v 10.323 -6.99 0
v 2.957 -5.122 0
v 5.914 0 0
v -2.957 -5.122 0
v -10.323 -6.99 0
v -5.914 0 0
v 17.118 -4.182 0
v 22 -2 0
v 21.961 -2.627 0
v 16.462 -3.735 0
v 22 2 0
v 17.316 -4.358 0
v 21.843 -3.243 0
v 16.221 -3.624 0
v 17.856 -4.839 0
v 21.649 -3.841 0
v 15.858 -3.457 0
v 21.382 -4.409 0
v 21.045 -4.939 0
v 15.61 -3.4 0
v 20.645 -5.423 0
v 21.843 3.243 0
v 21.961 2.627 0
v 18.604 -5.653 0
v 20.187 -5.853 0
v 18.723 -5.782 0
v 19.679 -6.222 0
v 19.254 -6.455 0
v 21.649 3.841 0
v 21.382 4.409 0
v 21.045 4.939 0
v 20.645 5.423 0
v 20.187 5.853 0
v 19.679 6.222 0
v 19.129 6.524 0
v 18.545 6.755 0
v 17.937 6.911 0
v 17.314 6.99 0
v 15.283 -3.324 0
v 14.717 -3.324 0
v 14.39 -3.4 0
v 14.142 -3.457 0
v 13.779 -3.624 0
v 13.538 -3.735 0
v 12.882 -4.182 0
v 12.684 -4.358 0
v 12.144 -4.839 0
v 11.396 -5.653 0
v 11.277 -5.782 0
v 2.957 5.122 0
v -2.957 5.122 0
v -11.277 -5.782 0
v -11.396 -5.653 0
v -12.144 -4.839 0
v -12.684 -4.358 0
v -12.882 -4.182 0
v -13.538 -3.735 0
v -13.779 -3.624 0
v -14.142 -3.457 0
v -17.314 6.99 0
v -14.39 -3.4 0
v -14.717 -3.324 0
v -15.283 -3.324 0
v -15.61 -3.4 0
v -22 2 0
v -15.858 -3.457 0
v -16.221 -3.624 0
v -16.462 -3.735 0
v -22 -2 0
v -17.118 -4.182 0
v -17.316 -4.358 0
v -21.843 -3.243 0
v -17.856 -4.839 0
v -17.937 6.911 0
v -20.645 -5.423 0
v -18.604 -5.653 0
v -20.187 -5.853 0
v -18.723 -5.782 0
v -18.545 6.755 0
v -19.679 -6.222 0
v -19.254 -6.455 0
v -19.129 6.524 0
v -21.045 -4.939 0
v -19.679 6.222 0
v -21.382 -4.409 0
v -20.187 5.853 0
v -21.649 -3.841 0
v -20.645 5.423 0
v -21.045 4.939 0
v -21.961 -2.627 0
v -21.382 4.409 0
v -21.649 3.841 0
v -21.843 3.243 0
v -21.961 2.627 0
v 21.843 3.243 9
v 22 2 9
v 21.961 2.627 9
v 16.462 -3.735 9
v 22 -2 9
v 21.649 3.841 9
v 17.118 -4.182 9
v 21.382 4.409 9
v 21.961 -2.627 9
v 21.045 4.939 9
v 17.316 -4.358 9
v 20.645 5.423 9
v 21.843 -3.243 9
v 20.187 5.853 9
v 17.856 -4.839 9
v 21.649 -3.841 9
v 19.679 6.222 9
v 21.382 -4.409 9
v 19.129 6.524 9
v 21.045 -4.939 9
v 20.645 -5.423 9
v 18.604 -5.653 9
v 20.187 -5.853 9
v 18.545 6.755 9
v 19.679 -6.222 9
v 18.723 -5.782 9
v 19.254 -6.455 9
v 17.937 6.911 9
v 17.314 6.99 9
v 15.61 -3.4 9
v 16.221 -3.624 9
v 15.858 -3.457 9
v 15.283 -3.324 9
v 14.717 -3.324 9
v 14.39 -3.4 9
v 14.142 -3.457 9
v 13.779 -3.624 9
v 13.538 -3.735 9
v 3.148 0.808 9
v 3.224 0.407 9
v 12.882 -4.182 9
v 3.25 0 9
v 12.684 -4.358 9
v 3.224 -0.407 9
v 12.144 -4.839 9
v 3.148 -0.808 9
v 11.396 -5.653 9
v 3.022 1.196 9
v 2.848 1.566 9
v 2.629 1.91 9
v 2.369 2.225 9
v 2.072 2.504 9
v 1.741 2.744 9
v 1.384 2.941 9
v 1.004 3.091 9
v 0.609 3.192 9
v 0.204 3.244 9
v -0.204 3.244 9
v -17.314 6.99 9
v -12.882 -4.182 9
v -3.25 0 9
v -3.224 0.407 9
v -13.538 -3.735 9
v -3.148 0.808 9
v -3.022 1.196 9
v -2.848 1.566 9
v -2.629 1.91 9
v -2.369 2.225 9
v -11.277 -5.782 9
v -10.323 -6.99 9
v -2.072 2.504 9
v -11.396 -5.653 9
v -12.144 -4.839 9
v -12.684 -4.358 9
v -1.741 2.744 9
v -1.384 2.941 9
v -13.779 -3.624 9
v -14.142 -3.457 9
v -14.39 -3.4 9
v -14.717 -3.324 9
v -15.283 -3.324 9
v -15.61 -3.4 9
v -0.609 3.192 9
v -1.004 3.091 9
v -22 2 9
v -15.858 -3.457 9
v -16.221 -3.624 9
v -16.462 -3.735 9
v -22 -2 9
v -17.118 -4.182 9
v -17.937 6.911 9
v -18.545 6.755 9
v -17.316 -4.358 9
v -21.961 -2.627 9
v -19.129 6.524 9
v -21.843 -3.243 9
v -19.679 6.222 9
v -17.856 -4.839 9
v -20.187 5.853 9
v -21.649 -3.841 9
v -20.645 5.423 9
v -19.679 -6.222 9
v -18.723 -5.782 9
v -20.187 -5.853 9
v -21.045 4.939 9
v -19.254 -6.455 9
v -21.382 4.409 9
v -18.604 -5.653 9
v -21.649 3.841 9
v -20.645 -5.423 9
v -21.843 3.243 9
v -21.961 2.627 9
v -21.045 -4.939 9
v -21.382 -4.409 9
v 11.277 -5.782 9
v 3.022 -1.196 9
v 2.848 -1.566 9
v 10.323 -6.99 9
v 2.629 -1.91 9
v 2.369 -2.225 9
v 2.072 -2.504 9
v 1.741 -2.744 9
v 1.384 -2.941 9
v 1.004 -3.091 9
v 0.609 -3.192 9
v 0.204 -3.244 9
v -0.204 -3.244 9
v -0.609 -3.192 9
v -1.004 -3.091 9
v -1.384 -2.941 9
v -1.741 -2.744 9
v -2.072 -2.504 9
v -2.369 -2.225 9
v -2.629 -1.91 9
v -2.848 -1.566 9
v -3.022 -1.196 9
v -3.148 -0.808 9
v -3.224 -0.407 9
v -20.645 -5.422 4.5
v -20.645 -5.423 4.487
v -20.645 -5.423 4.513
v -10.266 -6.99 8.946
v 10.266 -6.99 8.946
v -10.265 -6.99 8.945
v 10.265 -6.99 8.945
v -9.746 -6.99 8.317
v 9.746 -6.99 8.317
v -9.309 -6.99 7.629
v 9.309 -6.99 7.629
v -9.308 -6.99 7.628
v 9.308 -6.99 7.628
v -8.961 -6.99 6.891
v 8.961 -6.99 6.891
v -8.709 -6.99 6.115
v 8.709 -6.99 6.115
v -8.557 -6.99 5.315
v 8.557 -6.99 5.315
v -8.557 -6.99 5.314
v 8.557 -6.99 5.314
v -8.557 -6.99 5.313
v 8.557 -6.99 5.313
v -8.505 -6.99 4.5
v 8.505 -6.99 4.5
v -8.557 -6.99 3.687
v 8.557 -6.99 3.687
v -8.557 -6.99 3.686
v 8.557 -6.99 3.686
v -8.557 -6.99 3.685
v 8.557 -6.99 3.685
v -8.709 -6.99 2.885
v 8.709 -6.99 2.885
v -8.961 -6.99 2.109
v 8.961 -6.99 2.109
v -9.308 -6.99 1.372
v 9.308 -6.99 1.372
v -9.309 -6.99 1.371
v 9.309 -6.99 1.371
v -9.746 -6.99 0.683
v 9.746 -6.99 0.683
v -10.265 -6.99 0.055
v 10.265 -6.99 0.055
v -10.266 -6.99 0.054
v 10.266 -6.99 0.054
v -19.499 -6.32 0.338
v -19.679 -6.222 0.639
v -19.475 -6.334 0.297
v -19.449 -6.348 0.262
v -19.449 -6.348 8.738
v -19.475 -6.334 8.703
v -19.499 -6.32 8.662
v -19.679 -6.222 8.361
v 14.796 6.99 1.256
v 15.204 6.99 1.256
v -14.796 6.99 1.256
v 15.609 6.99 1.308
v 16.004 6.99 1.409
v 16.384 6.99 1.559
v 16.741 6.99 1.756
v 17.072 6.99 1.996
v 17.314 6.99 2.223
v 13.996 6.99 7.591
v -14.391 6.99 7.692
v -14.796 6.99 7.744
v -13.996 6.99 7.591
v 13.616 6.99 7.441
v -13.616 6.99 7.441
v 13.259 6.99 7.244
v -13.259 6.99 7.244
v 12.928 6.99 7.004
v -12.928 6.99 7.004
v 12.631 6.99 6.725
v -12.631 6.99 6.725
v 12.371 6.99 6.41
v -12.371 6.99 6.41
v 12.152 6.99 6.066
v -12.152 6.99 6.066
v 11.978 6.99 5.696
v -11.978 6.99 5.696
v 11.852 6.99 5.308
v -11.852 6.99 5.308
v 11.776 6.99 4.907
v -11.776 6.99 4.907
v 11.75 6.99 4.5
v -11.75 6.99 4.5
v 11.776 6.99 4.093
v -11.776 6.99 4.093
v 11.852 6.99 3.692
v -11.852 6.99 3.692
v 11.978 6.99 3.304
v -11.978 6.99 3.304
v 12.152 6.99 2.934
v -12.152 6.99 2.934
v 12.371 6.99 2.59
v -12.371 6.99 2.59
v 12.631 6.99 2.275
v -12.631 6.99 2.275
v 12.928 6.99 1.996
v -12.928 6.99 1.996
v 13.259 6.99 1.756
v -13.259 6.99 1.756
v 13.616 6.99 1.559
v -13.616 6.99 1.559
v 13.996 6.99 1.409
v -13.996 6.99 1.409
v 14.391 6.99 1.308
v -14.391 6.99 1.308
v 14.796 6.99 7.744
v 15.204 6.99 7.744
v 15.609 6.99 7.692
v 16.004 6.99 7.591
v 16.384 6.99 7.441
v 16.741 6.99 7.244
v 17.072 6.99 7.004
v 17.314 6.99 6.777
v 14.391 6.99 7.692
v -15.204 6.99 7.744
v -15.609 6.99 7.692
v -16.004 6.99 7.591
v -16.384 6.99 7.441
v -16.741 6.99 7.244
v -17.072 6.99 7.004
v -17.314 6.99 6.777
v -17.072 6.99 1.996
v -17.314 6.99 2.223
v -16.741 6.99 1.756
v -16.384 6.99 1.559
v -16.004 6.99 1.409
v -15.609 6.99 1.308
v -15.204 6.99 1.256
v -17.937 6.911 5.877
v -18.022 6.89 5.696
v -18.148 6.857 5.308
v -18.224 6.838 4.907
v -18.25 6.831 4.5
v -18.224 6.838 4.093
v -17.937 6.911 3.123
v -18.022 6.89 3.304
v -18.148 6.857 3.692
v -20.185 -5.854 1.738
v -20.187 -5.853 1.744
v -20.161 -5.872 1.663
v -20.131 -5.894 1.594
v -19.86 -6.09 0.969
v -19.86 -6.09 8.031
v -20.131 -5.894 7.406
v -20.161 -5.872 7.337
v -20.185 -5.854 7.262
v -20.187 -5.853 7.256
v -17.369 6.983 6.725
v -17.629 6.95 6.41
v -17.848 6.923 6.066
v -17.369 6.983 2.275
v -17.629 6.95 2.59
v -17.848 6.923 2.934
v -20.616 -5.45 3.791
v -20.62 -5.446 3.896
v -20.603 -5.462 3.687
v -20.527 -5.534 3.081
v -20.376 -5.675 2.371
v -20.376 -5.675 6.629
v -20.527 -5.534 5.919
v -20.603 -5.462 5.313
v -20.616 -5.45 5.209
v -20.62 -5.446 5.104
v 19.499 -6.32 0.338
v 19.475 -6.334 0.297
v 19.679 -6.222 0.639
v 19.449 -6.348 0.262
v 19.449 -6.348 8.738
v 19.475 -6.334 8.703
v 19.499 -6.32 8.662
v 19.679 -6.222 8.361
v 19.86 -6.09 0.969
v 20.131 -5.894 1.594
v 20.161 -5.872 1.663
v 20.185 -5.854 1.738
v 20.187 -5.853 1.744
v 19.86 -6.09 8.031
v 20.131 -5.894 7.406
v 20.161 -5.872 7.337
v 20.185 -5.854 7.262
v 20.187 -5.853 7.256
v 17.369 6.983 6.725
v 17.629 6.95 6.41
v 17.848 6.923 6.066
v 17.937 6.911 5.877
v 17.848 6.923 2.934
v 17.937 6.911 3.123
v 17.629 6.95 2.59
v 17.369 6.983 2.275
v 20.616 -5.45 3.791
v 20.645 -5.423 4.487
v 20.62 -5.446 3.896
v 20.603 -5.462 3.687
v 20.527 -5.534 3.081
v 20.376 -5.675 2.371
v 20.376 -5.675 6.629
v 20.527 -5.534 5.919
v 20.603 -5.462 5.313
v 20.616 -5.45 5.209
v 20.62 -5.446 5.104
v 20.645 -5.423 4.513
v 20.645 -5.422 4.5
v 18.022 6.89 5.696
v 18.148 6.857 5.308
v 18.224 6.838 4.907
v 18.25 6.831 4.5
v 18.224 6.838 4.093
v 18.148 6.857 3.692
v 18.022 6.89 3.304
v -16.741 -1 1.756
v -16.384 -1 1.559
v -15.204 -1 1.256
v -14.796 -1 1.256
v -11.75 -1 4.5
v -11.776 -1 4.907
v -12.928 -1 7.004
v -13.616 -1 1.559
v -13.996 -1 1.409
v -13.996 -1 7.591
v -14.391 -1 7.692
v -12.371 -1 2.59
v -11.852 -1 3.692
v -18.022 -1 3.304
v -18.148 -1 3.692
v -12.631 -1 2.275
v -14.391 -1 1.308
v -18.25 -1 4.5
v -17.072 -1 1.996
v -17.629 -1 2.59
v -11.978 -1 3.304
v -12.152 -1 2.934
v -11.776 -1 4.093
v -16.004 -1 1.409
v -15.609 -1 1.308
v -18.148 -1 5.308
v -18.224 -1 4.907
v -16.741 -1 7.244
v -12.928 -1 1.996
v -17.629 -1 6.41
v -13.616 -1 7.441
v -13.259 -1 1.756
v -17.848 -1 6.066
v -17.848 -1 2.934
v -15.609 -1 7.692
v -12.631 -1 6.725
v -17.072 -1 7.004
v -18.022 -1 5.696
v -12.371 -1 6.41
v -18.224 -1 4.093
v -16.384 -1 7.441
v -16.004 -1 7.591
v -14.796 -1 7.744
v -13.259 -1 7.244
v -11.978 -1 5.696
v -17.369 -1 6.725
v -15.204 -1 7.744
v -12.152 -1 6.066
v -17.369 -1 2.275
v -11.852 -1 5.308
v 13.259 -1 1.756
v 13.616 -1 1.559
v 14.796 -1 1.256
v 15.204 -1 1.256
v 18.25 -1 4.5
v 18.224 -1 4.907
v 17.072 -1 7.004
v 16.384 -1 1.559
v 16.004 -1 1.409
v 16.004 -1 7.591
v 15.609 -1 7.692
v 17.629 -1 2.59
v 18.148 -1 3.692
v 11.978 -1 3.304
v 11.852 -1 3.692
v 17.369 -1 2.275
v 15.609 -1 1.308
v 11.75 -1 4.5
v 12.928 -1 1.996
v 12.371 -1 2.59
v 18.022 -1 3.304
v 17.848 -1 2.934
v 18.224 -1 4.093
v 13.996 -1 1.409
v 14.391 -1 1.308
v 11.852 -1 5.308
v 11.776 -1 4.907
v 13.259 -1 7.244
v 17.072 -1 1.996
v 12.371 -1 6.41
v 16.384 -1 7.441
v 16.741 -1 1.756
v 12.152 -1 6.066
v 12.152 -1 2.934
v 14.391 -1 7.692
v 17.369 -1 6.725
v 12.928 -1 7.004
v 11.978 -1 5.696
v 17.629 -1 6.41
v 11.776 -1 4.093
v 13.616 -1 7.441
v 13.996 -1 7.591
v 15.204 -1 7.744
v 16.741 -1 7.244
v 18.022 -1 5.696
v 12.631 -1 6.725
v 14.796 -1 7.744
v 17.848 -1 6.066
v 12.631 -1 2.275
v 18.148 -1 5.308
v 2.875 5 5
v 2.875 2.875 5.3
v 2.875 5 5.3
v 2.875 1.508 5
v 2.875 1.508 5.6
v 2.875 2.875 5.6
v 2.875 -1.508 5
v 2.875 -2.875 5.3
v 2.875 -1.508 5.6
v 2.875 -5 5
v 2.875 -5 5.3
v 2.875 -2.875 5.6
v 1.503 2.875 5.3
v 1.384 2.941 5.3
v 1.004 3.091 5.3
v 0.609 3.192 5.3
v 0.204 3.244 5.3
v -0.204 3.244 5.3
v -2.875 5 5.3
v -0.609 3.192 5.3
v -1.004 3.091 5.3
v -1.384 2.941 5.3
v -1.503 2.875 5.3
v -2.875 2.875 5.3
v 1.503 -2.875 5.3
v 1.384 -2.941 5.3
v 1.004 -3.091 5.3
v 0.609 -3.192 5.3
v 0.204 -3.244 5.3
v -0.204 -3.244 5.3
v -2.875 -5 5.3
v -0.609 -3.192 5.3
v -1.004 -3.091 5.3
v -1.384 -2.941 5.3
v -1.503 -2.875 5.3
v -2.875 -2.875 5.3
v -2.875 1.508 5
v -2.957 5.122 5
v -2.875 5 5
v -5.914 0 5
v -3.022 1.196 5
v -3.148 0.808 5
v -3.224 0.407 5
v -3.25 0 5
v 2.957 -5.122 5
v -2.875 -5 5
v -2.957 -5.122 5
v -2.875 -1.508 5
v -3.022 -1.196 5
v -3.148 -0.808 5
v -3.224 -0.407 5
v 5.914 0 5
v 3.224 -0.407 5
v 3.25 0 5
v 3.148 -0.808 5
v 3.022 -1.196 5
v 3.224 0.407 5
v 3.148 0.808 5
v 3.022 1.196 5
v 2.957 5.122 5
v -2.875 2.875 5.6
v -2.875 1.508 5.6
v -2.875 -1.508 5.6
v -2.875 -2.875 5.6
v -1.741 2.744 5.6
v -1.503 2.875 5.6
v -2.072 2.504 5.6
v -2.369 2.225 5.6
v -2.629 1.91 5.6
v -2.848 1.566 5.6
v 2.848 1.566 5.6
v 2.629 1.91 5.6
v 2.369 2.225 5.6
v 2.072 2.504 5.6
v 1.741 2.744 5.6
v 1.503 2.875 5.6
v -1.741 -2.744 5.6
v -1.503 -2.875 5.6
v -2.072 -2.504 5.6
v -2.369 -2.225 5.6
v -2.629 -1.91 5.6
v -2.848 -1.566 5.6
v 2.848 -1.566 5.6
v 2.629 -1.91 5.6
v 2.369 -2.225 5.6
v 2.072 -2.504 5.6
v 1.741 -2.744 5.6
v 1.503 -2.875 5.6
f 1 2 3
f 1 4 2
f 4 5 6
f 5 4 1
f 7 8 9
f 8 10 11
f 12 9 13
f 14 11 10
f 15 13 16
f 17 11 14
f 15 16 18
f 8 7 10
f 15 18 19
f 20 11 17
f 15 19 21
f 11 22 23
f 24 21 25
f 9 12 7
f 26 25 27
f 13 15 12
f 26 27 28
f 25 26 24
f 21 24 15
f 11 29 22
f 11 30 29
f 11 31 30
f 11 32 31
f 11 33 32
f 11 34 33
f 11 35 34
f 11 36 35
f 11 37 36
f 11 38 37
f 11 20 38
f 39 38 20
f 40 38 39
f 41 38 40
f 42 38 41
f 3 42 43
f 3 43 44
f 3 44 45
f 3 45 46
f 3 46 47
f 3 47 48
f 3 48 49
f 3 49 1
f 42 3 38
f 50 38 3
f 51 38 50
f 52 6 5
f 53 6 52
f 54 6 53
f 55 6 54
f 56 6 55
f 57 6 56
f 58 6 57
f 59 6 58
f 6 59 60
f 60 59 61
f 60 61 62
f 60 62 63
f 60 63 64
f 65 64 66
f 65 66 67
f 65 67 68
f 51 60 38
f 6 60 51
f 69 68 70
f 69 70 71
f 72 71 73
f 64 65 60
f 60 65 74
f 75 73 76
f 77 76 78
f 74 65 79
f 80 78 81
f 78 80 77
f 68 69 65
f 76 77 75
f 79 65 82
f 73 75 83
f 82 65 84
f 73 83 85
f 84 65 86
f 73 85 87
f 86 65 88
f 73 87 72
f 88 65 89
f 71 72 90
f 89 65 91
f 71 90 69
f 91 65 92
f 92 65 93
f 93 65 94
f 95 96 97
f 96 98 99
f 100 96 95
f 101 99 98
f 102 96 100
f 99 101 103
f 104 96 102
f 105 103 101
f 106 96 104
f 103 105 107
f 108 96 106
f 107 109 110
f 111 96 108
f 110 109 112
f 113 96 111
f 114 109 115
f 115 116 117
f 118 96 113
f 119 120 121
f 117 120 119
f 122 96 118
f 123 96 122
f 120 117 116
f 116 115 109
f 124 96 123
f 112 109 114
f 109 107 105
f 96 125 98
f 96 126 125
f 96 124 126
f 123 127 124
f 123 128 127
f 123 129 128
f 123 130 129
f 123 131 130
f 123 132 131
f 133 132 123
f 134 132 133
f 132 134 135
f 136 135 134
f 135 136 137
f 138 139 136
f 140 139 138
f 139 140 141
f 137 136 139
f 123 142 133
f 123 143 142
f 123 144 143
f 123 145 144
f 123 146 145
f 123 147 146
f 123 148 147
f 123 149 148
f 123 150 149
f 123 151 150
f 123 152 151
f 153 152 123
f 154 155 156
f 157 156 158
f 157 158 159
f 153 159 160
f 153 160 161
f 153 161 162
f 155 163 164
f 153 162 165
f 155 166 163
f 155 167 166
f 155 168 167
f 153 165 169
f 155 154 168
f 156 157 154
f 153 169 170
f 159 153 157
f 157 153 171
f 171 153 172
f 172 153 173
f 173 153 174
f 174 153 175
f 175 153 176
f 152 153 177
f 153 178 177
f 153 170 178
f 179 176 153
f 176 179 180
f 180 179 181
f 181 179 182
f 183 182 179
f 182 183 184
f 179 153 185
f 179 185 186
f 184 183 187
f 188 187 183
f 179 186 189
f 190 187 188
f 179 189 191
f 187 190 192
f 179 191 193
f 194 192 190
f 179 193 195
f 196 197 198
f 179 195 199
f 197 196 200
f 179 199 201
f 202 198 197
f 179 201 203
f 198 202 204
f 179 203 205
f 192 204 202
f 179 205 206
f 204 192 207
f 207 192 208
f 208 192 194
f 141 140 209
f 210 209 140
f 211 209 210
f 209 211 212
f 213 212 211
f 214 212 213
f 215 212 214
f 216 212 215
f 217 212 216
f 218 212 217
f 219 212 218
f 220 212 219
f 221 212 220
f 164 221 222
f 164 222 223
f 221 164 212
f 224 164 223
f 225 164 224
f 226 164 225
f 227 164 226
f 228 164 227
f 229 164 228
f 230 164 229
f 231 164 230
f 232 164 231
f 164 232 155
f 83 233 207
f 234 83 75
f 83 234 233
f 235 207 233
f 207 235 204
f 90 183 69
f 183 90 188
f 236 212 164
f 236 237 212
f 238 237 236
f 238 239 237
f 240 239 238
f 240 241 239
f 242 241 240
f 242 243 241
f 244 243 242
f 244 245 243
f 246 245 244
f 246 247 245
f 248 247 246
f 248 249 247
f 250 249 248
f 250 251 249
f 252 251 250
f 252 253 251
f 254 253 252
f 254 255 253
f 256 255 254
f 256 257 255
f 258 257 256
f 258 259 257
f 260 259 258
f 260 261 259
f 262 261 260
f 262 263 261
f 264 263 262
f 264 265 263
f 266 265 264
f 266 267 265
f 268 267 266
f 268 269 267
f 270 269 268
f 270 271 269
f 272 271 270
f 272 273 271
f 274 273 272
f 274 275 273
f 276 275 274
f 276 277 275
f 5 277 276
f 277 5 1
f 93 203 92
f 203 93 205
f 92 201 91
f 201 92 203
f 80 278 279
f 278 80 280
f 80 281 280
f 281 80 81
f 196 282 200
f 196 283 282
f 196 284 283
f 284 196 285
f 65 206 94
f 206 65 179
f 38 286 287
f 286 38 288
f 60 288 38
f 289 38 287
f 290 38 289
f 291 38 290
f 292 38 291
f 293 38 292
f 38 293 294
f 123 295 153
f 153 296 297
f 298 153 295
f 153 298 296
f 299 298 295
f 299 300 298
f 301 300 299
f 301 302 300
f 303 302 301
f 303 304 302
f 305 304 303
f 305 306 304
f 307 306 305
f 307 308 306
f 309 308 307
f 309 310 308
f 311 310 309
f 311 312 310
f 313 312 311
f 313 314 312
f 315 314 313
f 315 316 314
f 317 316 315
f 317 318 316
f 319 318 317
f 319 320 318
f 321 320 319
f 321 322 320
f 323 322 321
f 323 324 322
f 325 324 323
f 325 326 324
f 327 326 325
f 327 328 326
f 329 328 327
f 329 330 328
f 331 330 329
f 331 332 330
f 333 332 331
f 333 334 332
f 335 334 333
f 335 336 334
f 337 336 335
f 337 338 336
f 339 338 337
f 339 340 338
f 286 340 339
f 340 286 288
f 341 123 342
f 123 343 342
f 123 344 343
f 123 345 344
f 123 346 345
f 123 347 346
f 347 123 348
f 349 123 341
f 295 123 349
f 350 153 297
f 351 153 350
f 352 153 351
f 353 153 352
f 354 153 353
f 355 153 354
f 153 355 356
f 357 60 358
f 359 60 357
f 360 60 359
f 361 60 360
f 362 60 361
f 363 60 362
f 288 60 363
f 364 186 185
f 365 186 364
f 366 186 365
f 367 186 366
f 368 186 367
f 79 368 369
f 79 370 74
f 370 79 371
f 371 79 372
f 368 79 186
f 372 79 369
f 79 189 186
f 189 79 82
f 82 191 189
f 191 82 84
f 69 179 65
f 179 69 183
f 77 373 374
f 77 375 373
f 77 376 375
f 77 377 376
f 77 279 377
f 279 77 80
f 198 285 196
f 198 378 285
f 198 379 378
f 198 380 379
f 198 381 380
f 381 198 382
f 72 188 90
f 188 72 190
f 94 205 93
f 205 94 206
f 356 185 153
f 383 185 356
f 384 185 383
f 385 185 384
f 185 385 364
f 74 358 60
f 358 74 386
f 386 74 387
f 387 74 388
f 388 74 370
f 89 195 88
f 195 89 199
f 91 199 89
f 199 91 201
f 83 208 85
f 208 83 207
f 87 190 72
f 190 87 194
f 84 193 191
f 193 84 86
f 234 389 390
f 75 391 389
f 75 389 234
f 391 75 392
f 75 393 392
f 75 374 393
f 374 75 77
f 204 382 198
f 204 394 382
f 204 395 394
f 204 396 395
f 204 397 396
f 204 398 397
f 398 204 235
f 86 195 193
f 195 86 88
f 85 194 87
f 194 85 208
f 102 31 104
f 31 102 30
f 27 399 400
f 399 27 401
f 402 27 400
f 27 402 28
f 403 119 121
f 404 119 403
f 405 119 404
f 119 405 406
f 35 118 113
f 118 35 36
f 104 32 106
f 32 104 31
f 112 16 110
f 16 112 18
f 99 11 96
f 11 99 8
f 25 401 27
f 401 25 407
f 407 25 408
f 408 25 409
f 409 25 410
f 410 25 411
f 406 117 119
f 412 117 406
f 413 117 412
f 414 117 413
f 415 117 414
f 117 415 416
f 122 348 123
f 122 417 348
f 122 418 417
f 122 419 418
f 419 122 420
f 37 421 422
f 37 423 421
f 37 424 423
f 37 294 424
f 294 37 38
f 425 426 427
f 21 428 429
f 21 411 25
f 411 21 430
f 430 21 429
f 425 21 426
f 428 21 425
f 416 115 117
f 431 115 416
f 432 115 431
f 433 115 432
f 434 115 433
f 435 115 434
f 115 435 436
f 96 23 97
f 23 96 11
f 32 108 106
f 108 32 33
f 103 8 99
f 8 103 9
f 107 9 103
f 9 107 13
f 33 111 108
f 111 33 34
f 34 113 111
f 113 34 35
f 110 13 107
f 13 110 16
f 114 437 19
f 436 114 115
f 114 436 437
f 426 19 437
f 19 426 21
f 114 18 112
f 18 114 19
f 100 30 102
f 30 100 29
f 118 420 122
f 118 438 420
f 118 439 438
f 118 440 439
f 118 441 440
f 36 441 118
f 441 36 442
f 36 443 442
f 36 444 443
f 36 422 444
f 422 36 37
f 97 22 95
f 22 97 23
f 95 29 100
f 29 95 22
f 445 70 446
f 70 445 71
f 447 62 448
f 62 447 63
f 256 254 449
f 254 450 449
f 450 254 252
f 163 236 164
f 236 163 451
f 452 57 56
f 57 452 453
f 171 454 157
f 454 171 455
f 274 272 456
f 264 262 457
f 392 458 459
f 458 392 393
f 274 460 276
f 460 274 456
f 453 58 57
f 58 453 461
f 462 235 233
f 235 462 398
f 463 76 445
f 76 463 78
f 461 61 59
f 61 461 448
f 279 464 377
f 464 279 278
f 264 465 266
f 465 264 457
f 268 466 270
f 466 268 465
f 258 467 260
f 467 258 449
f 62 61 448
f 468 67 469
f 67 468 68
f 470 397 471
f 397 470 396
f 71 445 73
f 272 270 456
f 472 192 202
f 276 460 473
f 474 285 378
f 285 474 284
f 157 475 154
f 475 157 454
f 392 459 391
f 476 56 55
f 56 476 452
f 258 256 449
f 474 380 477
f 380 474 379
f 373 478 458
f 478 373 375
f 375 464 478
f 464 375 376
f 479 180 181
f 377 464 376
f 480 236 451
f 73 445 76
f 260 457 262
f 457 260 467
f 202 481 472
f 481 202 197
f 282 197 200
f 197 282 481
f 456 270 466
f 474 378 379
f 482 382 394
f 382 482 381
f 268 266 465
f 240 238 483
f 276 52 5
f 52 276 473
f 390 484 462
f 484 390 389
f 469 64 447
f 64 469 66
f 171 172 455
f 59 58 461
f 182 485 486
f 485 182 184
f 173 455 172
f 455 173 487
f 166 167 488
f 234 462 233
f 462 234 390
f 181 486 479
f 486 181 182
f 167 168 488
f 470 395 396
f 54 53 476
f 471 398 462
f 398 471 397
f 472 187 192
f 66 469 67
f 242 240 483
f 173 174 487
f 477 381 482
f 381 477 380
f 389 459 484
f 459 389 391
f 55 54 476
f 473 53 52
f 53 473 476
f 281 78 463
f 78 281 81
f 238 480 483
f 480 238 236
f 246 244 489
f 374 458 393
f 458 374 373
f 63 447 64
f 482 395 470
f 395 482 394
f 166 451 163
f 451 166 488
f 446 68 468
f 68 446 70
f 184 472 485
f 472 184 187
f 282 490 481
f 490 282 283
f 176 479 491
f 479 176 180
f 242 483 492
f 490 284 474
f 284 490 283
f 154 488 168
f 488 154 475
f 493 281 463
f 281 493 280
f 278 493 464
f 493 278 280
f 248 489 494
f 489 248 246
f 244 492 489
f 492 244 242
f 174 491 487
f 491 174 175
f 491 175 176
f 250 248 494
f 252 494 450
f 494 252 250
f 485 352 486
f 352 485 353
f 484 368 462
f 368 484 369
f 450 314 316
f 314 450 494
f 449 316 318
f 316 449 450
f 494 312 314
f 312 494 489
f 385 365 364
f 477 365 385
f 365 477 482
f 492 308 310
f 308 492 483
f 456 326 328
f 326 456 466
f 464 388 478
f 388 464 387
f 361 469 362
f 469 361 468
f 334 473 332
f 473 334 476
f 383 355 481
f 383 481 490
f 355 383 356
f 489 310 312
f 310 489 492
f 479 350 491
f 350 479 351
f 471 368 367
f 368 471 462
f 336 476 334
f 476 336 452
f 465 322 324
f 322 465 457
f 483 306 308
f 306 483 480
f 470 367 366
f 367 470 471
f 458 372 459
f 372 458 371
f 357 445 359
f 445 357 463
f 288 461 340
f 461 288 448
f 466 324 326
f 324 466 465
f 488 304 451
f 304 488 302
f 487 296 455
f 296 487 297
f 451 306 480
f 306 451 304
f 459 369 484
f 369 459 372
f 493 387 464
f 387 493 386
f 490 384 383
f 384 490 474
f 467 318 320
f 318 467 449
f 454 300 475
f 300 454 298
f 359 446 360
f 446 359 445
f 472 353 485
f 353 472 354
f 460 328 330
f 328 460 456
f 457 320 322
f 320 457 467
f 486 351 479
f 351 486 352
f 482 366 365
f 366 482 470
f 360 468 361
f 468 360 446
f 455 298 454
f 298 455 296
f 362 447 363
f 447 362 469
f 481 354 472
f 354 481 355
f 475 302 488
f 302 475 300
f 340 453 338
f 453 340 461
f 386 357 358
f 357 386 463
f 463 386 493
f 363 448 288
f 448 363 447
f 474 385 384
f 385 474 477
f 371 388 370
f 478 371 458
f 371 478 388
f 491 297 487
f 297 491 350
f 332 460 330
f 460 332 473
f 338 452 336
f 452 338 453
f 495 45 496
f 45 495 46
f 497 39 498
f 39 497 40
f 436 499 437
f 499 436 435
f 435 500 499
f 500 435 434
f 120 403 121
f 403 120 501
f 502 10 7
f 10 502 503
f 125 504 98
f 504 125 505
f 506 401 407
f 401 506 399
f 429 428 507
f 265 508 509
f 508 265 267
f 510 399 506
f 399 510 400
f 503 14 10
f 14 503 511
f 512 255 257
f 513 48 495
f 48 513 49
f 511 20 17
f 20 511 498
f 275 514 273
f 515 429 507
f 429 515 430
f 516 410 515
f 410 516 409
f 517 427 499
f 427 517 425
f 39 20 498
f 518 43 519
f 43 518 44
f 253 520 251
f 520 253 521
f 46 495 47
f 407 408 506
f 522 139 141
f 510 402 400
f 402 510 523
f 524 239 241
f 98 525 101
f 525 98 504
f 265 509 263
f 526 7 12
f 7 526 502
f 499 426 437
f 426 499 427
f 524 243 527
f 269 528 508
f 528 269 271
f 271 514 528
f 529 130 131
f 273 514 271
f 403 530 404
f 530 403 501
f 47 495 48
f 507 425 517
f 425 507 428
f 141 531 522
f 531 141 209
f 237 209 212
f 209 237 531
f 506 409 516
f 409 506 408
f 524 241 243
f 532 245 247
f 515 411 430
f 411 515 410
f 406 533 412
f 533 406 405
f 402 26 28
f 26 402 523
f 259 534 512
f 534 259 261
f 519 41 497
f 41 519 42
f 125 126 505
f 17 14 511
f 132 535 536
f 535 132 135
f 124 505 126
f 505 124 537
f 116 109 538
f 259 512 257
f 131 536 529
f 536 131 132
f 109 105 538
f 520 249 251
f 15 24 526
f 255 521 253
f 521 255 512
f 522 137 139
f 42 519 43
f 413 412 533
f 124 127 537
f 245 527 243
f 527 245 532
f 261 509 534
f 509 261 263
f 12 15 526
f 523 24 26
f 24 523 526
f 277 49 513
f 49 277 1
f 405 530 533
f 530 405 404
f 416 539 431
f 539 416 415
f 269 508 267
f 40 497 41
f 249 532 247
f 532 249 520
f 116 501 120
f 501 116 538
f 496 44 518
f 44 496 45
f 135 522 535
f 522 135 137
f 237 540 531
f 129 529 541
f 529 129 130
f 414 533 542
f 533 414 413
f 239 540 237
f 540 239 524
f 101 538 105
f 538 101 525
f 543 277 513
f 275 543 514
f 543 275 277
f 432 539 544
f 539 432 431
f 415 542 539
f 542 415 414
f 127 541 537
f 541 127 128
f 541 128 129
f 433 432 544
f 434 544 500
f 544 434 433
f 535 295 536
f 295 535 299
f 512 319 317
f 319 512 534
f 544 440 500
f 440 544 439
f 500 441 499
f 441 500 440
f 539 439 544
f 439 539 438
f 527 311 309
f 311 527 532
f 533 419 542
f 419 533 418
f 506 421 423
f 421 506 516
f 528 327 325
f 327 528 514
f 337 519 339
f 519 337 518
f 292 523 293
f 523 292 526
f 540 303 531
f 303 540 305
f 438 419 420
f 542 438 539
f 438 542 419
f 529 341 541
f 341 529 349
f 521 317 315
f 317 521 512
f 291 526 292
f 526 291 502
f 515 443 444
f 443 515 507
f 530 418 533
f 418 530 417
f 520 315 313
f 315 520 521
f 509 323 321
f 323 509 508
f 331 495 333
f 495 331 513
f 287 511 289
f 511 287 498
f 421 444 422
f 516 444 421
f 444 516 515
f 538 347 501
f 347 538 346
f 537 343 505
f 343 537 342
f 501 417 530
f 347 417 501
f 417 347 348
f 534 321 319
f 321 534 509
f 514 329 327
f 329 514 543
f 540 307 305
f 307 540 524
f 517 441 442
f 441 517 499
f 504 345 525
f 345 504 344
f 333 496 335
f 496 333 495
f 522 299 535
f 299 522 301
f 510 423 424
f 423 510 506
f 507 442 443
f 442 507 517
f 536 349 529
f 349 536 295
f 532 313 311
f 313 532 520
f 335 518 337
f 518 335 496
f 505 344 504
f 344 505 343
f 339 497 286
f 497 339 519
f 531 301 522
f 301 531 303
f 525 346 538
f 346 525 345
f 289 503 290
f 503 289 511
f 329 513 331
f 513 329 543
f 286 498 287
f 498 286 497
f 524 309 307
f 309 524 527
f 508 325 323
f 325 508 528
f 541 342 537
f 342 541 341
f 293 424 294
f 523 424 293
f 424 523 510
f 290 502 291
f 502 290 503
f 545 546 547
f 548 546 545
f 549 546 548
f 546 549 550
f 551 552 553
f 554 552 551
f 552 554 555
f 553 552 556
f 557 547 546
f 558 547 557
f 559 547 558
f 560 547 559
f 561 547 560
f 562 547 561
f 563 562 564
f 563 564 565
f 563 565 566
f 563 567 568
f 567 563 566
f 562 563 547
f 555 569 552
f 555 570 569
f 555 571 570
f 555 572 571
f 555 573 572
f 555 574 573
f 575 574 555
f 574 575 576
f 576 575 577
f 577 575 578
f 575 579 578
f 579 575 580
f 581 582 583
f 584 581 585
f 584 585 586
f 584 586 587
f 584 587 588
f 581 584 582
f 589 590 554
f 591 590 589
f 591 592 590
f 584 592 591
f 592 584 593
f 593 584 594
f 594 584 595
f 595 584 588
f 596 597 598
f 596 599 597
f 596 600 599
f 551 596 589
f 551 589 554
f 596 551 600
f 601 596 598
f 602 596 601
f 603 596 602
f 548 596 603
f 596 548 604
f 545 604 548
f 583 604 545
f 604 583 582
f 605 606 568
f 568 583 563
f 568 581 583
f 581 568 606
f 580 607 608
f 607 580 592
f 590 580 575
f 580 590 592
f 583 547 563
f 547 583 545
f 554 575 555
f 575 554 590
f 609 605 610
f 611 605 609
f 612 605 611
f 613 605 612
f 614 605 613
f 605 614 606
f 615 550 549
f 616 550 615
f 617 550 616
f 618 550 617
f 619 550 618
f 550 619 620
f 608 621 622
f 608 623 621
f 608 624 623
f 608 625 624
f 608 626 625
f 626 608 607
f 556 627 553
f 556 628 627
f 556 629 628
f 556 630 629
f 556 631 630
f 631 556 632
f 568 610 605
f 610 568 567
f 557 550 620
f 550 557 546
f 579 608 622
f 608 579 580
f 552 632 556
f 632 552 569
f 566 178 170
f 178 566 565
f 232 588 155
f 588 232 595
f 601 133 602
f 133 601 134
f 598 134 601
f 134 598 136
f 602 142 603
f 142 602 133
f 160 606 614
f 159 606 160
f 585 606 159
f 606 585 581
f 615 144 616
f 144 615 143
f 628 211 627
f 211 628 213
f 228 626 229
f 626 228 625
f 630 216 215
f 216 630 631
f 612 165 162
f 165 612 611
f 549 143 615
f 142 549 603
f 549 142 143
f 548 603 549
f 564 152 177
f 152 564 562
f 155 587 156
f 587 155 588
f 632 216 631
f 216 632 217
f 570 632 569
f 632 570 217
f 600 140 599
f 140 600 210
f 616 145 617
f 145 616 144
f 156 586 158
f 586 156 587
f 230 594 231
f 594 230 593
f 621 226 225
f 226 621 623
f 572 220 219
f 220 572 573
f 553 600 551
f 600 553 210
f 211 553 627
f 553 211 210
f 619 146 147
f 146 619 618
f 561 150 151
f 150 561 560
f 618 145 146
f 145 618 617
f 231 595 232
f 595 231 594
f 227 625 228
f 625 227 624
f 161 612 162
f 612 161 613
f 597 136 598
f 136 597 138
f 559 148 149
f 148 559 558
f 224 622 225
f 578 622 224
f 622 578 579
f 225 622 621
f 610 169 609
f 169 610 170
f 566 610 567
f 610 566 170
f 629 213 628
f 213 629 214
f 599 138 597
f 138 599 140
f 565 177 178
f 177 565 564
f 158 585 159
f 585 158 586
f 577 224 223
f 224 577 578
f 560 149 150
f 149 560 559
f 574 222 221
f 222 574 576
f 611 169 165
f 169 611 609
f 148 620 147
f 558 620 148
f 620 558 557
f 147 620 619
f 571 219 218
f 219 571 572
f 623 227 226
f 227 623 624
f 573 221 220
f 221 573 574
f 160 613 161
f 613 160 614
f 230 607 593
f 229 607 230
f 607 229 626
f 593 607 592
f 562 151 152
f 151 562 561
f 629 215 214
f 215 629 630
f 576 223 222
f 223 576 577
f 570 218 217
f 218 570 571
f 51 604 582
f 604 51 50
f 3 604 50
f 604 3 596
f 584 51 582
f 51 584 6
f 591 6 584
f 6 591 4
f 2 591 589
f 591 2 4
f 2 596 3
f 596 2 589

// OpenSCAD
$fn = 50;


difference() {
	union() {
		cylinder(h = 9, r = 7.0000000000);
		translate(v = [-7.5000000000, 0.0000000000, 0]) {
			hull() {
				translate(v = [-9.5000000000, 2.0000000000, 0]) {
					cylinder(h = 9, r = 5);
				}
				translate(v = [9.5000000000, 2.0000000000, 0]) {
					cylinder(h = 9, r = 5);
				}
				translate(v = [-9.5000000000, -2.0000000000, 0]) {
					cylinder(h = 9, r = 5);
				}
				translate(v = [9.5000000000, -2.0000000000, 0]) {
					cylinder(h = 9, r = 5);
				}
			}
		}
		translate(v = [-7.5000000000, 0.0000000000, 0]) {
			hull() {
				translate(v = [-9.5000000000, 2.0000000000, 0]) {
					cylinder(h = 9, r = 5);
				}
				translate(v = [9.5000000000, 2.0000000000, 0]) {
					cylinder(h = 9, r = 5);
				}
				translate(v = [-9.5000000000, -2.0000000000, 0]) {
					cylinder(h = 9, r = 5);
				}
				translate(v = [9.5000000000, -2.0000000000, 0]) {
					cylinder(h = 9, r = 5);
				}
			}
		}
		translate(v = [7.5000000000, 0.0000000000, 0]) {
			hull() {
				translate(v = [-9.5000000000, 2.0000000000, 0]) {
					cylinder(h = 9, r = 5);
				}
				translate(v = [9.5000000000, 2.0000000000, 0]) {
					cylinder(h = 9, r = 5);
				}
				translate(v = [-9.5000000000, -2.0000000000, 0]) {
					cylinder(h = 9, r = 5);
				}
				translate(v = [9.5000000000, -2.0000000000, 0]) {
					cylinder(h = 9, r = 5);
				}
			}
		}
		translate(v = [7.5000000000, 0.0000000000, 0]) {
			hull() {
				translate(v = [-9.5000000000, 2.0000000000, 0]) {
					cylinder(h = 9, r = 5);
				}
				translate(v = [9.5000000000, 2.0000000000, 0]) {
					cylinder(h = 9, r = 5);
				}
				translate(v = [-9.5000000000, -2.0000000000, 0]) {
					cylinder(h = 9, r = 5);
				}
				translate(v = [9.5000000000, -2.0000000000, 0]) {
					cylinder(h = 9, r = 5);
				}
			}
		}
	}
	union() {
		translate(v = [-15.0000000000, -7.0000000000, 4.5000000000]) {
			rotate(a = [90, 0, 0]) {
				difference() {
					union() {
						#translate(v = [0, 0, -14.0000000000]) {
							cylinder(h = 14, r = 2.2500000000);
						}
						#translate(v = [0, 0, -6]) {
							cylinder(h = 6, r1 = 3.2500000000, r2 = 6.5000000000);
						}
						#translate(v = [0, 0, -14.0000000000]) {
							cylinder(h = 14, r = 3.2500000000);
						}
						#translate(v = [0, 0, -14.0000000000]) {
							cylinder(h = 14, r = 2.2500000000);
						}
					}
					union();
				}
			}
		}
		translate(v = [15.0000000000, -7.0000000000, 4.5000000000]) {
			rotate(a = [90, 0, 0]) {
				difference() {
					union() {
						#translate(v = [0, 0, -14.0000000000]) {
							cylinder(h = 14, r = 2.2500000000);
						}
						#translate(v = [0, 0, -6]) {
							cylinder(h = 6, r1 = 3.2500000000, r2 = 6.5000000000);
						}
						#translate(v = [0, 0, -14.0000000000]) {
							cylinder(h = 14, r = 3.2500000000);
						}
						#translate(v = [0, 0, -14.0000000000]) {
							cylinder(h = 14, r = 2.2500000000);
						}
					}
					union();
				}
			}
		}
		translate(v = [0.0000000000, 0.0000000000, 0]) {
			rotate(a = [0, 0, 0]) {
				difference() {
					union() {
						#translate(v = [-2.8750000000, -5.0000000000, -0.3000000000]) {
							cube(size = [5.7500000000, 10, 0.3000000000]);
						}
						#translate(v = [-2.8750000000, -2.8750000000, -0.6000000000]) {
							cube(size = [5.7500000000, 5.7500000000, 0.3000000000]);
						}
						#translate(v = [-2.8750000000, -5.0000000000, 5]) {
							cube(size = [5.7500000000, 10, 0.3000000000]);
						}
						#translate(v = [-2.8750000000, -2.8750000000, 5.3000000000]) {
							cube(size = [5.7500000000, 5.7500000000, 0.3000000000]);
						}
						#translate(v = [0, 0, -100.0000000000]) {
							cylinder(h = 200, r = 3.2500000000);
						}
						#linear_extrude(height = 5) {
							polygon(points = [[5.9142500000, 0.0000000000], [2.9571250000, 5.1218907443], [-2.9571250000, 5.1218907443], [-5.9142500000, 0.0000000000], [-2.9571250000, -5.1218907443], [2.9571250000, -5.1218907443]]);
						}
						#translate(v = [-2.8750000000, -5.0000000000, -0.3000000000]) {
							cube(size = [5.7500000000, 10, 0.3000000000]);
						}
						#translate(v = [-2.8750000000, -2.8750000000, -0.6000000000]) {
							cube(size = [5.7500000000, 5.7500000000, 0.3000000000]);
						}
						#translate(v = [-2.8750000000, -5.0000000000, 5]) {
							cube(size = [5.7500000000, 10, 0.3000000000]);
						}
						#translate(v = [-2.8750000000, -2.8750000000, 5.3000000000]) {
							cube(size = [5.7500000000, 5.7500000000, 0.3000000000]);
						}
						#translate(v = [0, 0, -100.0000000000]) {
							cylinder(h = 200, r = 3.2500000000);
						}
						#translate(v = [-2.8750000000, -5.0000000000, -0.3000000000]) {
							cube(size = [5.7500000000, 10, 0.3000000000]);
						}
						#translate(v = [-2.8750000000, -2.8750000000, -0.6000000000]) {
							cube(size = [5.7500000000, 5.7500000000, 0.3000000000]);
						}
						#translate(v = [-2.8750000000, -5.0000000000, 5]) {
							cube(size = [5.7500000000, 10, 0.3000000000]);
						}
						#translate(v = [-2.8750000000, -2.8750000000, 5.3000000000]) {
							cube(size = [5.7500000000, 5.7500000000, 0.3000000000]);
						}
						#translate(v = [0, 0, -100.0000000000]) {
							cylinder(h = 200, r = 3.2500000000);
						}
					}
					union();
				}
			}
		}
		translate(v = [0, 0, -100]) {
			cylinder(h = 200, r = 3.2500000000);
		}
		translate(v = [0, 0, -100]) {
			cylinder(h = 200, r = 1.8000000000);
		}
	}
}
